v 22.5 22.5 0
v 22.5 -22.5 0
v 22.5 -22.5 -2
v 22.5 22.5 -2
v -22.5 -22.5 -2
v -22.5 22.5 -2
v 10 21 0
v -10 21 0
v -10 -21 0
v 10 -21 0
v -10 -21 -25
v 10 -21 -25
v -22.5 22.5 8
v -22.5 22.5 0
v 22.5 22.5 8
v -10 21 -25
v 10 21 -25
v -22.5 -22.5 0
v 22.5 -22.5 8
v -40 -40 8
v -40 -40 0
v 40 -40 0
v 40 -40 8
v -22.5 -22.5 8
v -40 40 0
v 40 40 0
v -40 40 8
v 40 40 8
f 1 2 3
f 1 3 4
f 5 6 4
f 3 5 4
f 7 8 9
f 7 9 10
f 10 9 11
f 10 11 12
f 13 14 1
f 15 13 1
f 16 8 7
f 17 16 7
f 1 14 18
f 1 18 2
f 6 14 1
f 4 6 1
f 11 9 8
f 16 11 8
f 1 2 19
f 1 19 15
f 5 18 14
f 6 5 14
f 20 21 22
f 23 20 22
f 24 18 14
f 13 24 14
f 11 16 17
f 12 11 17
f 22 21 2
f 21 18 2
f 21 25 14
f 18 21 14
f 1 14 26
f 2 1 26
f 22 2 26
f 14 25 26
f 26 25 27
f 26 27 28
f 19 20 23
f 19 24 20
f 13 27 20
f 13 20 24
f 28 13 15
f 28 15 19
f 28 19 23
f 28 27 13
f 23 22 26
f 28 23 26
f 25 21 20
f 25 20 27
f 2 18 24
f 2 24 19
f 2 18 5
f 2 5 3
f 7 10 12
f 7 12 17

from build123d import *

# Parameters (mm, degrees)
F0_W     = 80
F0_H     = 80
F0_W_2   = 45
F0_H_2   = 45
F1_DEPTH = 8
F2_W     = 20
F2_H     = 42
F3_DEPTH = 25
F4_DEPTH = 2


with BuildPart() as f1:
    # F0 (on Top) → F1 (new body)
    with BuildSketch(Plane.XY):
        Rectangle(F0_W, F0_H)
        Rectangle(F0_W_2, F0_H_2, mode=Mode.SUBTRACT)
    extrude(amount=F1_DEPTH)


with BuildPart() as f3:
    # F2 (on Top) → F3 (new body)
    with BuildSketch(Plane.XY):
        Rectangle(F2_W, F2_H)
    extrude(amount=-F3_DEPTH)


with BuildPart() as f4:
    # F0 (on Top) → F4 (new body)
    with BuildSketch(Plane.XY):
        Rectangle(F0_W_2, F0_H_2)
    extrude(amount=-F4_DEPTH)


solid = Compound([f1.part, f3.part, f4.part])
